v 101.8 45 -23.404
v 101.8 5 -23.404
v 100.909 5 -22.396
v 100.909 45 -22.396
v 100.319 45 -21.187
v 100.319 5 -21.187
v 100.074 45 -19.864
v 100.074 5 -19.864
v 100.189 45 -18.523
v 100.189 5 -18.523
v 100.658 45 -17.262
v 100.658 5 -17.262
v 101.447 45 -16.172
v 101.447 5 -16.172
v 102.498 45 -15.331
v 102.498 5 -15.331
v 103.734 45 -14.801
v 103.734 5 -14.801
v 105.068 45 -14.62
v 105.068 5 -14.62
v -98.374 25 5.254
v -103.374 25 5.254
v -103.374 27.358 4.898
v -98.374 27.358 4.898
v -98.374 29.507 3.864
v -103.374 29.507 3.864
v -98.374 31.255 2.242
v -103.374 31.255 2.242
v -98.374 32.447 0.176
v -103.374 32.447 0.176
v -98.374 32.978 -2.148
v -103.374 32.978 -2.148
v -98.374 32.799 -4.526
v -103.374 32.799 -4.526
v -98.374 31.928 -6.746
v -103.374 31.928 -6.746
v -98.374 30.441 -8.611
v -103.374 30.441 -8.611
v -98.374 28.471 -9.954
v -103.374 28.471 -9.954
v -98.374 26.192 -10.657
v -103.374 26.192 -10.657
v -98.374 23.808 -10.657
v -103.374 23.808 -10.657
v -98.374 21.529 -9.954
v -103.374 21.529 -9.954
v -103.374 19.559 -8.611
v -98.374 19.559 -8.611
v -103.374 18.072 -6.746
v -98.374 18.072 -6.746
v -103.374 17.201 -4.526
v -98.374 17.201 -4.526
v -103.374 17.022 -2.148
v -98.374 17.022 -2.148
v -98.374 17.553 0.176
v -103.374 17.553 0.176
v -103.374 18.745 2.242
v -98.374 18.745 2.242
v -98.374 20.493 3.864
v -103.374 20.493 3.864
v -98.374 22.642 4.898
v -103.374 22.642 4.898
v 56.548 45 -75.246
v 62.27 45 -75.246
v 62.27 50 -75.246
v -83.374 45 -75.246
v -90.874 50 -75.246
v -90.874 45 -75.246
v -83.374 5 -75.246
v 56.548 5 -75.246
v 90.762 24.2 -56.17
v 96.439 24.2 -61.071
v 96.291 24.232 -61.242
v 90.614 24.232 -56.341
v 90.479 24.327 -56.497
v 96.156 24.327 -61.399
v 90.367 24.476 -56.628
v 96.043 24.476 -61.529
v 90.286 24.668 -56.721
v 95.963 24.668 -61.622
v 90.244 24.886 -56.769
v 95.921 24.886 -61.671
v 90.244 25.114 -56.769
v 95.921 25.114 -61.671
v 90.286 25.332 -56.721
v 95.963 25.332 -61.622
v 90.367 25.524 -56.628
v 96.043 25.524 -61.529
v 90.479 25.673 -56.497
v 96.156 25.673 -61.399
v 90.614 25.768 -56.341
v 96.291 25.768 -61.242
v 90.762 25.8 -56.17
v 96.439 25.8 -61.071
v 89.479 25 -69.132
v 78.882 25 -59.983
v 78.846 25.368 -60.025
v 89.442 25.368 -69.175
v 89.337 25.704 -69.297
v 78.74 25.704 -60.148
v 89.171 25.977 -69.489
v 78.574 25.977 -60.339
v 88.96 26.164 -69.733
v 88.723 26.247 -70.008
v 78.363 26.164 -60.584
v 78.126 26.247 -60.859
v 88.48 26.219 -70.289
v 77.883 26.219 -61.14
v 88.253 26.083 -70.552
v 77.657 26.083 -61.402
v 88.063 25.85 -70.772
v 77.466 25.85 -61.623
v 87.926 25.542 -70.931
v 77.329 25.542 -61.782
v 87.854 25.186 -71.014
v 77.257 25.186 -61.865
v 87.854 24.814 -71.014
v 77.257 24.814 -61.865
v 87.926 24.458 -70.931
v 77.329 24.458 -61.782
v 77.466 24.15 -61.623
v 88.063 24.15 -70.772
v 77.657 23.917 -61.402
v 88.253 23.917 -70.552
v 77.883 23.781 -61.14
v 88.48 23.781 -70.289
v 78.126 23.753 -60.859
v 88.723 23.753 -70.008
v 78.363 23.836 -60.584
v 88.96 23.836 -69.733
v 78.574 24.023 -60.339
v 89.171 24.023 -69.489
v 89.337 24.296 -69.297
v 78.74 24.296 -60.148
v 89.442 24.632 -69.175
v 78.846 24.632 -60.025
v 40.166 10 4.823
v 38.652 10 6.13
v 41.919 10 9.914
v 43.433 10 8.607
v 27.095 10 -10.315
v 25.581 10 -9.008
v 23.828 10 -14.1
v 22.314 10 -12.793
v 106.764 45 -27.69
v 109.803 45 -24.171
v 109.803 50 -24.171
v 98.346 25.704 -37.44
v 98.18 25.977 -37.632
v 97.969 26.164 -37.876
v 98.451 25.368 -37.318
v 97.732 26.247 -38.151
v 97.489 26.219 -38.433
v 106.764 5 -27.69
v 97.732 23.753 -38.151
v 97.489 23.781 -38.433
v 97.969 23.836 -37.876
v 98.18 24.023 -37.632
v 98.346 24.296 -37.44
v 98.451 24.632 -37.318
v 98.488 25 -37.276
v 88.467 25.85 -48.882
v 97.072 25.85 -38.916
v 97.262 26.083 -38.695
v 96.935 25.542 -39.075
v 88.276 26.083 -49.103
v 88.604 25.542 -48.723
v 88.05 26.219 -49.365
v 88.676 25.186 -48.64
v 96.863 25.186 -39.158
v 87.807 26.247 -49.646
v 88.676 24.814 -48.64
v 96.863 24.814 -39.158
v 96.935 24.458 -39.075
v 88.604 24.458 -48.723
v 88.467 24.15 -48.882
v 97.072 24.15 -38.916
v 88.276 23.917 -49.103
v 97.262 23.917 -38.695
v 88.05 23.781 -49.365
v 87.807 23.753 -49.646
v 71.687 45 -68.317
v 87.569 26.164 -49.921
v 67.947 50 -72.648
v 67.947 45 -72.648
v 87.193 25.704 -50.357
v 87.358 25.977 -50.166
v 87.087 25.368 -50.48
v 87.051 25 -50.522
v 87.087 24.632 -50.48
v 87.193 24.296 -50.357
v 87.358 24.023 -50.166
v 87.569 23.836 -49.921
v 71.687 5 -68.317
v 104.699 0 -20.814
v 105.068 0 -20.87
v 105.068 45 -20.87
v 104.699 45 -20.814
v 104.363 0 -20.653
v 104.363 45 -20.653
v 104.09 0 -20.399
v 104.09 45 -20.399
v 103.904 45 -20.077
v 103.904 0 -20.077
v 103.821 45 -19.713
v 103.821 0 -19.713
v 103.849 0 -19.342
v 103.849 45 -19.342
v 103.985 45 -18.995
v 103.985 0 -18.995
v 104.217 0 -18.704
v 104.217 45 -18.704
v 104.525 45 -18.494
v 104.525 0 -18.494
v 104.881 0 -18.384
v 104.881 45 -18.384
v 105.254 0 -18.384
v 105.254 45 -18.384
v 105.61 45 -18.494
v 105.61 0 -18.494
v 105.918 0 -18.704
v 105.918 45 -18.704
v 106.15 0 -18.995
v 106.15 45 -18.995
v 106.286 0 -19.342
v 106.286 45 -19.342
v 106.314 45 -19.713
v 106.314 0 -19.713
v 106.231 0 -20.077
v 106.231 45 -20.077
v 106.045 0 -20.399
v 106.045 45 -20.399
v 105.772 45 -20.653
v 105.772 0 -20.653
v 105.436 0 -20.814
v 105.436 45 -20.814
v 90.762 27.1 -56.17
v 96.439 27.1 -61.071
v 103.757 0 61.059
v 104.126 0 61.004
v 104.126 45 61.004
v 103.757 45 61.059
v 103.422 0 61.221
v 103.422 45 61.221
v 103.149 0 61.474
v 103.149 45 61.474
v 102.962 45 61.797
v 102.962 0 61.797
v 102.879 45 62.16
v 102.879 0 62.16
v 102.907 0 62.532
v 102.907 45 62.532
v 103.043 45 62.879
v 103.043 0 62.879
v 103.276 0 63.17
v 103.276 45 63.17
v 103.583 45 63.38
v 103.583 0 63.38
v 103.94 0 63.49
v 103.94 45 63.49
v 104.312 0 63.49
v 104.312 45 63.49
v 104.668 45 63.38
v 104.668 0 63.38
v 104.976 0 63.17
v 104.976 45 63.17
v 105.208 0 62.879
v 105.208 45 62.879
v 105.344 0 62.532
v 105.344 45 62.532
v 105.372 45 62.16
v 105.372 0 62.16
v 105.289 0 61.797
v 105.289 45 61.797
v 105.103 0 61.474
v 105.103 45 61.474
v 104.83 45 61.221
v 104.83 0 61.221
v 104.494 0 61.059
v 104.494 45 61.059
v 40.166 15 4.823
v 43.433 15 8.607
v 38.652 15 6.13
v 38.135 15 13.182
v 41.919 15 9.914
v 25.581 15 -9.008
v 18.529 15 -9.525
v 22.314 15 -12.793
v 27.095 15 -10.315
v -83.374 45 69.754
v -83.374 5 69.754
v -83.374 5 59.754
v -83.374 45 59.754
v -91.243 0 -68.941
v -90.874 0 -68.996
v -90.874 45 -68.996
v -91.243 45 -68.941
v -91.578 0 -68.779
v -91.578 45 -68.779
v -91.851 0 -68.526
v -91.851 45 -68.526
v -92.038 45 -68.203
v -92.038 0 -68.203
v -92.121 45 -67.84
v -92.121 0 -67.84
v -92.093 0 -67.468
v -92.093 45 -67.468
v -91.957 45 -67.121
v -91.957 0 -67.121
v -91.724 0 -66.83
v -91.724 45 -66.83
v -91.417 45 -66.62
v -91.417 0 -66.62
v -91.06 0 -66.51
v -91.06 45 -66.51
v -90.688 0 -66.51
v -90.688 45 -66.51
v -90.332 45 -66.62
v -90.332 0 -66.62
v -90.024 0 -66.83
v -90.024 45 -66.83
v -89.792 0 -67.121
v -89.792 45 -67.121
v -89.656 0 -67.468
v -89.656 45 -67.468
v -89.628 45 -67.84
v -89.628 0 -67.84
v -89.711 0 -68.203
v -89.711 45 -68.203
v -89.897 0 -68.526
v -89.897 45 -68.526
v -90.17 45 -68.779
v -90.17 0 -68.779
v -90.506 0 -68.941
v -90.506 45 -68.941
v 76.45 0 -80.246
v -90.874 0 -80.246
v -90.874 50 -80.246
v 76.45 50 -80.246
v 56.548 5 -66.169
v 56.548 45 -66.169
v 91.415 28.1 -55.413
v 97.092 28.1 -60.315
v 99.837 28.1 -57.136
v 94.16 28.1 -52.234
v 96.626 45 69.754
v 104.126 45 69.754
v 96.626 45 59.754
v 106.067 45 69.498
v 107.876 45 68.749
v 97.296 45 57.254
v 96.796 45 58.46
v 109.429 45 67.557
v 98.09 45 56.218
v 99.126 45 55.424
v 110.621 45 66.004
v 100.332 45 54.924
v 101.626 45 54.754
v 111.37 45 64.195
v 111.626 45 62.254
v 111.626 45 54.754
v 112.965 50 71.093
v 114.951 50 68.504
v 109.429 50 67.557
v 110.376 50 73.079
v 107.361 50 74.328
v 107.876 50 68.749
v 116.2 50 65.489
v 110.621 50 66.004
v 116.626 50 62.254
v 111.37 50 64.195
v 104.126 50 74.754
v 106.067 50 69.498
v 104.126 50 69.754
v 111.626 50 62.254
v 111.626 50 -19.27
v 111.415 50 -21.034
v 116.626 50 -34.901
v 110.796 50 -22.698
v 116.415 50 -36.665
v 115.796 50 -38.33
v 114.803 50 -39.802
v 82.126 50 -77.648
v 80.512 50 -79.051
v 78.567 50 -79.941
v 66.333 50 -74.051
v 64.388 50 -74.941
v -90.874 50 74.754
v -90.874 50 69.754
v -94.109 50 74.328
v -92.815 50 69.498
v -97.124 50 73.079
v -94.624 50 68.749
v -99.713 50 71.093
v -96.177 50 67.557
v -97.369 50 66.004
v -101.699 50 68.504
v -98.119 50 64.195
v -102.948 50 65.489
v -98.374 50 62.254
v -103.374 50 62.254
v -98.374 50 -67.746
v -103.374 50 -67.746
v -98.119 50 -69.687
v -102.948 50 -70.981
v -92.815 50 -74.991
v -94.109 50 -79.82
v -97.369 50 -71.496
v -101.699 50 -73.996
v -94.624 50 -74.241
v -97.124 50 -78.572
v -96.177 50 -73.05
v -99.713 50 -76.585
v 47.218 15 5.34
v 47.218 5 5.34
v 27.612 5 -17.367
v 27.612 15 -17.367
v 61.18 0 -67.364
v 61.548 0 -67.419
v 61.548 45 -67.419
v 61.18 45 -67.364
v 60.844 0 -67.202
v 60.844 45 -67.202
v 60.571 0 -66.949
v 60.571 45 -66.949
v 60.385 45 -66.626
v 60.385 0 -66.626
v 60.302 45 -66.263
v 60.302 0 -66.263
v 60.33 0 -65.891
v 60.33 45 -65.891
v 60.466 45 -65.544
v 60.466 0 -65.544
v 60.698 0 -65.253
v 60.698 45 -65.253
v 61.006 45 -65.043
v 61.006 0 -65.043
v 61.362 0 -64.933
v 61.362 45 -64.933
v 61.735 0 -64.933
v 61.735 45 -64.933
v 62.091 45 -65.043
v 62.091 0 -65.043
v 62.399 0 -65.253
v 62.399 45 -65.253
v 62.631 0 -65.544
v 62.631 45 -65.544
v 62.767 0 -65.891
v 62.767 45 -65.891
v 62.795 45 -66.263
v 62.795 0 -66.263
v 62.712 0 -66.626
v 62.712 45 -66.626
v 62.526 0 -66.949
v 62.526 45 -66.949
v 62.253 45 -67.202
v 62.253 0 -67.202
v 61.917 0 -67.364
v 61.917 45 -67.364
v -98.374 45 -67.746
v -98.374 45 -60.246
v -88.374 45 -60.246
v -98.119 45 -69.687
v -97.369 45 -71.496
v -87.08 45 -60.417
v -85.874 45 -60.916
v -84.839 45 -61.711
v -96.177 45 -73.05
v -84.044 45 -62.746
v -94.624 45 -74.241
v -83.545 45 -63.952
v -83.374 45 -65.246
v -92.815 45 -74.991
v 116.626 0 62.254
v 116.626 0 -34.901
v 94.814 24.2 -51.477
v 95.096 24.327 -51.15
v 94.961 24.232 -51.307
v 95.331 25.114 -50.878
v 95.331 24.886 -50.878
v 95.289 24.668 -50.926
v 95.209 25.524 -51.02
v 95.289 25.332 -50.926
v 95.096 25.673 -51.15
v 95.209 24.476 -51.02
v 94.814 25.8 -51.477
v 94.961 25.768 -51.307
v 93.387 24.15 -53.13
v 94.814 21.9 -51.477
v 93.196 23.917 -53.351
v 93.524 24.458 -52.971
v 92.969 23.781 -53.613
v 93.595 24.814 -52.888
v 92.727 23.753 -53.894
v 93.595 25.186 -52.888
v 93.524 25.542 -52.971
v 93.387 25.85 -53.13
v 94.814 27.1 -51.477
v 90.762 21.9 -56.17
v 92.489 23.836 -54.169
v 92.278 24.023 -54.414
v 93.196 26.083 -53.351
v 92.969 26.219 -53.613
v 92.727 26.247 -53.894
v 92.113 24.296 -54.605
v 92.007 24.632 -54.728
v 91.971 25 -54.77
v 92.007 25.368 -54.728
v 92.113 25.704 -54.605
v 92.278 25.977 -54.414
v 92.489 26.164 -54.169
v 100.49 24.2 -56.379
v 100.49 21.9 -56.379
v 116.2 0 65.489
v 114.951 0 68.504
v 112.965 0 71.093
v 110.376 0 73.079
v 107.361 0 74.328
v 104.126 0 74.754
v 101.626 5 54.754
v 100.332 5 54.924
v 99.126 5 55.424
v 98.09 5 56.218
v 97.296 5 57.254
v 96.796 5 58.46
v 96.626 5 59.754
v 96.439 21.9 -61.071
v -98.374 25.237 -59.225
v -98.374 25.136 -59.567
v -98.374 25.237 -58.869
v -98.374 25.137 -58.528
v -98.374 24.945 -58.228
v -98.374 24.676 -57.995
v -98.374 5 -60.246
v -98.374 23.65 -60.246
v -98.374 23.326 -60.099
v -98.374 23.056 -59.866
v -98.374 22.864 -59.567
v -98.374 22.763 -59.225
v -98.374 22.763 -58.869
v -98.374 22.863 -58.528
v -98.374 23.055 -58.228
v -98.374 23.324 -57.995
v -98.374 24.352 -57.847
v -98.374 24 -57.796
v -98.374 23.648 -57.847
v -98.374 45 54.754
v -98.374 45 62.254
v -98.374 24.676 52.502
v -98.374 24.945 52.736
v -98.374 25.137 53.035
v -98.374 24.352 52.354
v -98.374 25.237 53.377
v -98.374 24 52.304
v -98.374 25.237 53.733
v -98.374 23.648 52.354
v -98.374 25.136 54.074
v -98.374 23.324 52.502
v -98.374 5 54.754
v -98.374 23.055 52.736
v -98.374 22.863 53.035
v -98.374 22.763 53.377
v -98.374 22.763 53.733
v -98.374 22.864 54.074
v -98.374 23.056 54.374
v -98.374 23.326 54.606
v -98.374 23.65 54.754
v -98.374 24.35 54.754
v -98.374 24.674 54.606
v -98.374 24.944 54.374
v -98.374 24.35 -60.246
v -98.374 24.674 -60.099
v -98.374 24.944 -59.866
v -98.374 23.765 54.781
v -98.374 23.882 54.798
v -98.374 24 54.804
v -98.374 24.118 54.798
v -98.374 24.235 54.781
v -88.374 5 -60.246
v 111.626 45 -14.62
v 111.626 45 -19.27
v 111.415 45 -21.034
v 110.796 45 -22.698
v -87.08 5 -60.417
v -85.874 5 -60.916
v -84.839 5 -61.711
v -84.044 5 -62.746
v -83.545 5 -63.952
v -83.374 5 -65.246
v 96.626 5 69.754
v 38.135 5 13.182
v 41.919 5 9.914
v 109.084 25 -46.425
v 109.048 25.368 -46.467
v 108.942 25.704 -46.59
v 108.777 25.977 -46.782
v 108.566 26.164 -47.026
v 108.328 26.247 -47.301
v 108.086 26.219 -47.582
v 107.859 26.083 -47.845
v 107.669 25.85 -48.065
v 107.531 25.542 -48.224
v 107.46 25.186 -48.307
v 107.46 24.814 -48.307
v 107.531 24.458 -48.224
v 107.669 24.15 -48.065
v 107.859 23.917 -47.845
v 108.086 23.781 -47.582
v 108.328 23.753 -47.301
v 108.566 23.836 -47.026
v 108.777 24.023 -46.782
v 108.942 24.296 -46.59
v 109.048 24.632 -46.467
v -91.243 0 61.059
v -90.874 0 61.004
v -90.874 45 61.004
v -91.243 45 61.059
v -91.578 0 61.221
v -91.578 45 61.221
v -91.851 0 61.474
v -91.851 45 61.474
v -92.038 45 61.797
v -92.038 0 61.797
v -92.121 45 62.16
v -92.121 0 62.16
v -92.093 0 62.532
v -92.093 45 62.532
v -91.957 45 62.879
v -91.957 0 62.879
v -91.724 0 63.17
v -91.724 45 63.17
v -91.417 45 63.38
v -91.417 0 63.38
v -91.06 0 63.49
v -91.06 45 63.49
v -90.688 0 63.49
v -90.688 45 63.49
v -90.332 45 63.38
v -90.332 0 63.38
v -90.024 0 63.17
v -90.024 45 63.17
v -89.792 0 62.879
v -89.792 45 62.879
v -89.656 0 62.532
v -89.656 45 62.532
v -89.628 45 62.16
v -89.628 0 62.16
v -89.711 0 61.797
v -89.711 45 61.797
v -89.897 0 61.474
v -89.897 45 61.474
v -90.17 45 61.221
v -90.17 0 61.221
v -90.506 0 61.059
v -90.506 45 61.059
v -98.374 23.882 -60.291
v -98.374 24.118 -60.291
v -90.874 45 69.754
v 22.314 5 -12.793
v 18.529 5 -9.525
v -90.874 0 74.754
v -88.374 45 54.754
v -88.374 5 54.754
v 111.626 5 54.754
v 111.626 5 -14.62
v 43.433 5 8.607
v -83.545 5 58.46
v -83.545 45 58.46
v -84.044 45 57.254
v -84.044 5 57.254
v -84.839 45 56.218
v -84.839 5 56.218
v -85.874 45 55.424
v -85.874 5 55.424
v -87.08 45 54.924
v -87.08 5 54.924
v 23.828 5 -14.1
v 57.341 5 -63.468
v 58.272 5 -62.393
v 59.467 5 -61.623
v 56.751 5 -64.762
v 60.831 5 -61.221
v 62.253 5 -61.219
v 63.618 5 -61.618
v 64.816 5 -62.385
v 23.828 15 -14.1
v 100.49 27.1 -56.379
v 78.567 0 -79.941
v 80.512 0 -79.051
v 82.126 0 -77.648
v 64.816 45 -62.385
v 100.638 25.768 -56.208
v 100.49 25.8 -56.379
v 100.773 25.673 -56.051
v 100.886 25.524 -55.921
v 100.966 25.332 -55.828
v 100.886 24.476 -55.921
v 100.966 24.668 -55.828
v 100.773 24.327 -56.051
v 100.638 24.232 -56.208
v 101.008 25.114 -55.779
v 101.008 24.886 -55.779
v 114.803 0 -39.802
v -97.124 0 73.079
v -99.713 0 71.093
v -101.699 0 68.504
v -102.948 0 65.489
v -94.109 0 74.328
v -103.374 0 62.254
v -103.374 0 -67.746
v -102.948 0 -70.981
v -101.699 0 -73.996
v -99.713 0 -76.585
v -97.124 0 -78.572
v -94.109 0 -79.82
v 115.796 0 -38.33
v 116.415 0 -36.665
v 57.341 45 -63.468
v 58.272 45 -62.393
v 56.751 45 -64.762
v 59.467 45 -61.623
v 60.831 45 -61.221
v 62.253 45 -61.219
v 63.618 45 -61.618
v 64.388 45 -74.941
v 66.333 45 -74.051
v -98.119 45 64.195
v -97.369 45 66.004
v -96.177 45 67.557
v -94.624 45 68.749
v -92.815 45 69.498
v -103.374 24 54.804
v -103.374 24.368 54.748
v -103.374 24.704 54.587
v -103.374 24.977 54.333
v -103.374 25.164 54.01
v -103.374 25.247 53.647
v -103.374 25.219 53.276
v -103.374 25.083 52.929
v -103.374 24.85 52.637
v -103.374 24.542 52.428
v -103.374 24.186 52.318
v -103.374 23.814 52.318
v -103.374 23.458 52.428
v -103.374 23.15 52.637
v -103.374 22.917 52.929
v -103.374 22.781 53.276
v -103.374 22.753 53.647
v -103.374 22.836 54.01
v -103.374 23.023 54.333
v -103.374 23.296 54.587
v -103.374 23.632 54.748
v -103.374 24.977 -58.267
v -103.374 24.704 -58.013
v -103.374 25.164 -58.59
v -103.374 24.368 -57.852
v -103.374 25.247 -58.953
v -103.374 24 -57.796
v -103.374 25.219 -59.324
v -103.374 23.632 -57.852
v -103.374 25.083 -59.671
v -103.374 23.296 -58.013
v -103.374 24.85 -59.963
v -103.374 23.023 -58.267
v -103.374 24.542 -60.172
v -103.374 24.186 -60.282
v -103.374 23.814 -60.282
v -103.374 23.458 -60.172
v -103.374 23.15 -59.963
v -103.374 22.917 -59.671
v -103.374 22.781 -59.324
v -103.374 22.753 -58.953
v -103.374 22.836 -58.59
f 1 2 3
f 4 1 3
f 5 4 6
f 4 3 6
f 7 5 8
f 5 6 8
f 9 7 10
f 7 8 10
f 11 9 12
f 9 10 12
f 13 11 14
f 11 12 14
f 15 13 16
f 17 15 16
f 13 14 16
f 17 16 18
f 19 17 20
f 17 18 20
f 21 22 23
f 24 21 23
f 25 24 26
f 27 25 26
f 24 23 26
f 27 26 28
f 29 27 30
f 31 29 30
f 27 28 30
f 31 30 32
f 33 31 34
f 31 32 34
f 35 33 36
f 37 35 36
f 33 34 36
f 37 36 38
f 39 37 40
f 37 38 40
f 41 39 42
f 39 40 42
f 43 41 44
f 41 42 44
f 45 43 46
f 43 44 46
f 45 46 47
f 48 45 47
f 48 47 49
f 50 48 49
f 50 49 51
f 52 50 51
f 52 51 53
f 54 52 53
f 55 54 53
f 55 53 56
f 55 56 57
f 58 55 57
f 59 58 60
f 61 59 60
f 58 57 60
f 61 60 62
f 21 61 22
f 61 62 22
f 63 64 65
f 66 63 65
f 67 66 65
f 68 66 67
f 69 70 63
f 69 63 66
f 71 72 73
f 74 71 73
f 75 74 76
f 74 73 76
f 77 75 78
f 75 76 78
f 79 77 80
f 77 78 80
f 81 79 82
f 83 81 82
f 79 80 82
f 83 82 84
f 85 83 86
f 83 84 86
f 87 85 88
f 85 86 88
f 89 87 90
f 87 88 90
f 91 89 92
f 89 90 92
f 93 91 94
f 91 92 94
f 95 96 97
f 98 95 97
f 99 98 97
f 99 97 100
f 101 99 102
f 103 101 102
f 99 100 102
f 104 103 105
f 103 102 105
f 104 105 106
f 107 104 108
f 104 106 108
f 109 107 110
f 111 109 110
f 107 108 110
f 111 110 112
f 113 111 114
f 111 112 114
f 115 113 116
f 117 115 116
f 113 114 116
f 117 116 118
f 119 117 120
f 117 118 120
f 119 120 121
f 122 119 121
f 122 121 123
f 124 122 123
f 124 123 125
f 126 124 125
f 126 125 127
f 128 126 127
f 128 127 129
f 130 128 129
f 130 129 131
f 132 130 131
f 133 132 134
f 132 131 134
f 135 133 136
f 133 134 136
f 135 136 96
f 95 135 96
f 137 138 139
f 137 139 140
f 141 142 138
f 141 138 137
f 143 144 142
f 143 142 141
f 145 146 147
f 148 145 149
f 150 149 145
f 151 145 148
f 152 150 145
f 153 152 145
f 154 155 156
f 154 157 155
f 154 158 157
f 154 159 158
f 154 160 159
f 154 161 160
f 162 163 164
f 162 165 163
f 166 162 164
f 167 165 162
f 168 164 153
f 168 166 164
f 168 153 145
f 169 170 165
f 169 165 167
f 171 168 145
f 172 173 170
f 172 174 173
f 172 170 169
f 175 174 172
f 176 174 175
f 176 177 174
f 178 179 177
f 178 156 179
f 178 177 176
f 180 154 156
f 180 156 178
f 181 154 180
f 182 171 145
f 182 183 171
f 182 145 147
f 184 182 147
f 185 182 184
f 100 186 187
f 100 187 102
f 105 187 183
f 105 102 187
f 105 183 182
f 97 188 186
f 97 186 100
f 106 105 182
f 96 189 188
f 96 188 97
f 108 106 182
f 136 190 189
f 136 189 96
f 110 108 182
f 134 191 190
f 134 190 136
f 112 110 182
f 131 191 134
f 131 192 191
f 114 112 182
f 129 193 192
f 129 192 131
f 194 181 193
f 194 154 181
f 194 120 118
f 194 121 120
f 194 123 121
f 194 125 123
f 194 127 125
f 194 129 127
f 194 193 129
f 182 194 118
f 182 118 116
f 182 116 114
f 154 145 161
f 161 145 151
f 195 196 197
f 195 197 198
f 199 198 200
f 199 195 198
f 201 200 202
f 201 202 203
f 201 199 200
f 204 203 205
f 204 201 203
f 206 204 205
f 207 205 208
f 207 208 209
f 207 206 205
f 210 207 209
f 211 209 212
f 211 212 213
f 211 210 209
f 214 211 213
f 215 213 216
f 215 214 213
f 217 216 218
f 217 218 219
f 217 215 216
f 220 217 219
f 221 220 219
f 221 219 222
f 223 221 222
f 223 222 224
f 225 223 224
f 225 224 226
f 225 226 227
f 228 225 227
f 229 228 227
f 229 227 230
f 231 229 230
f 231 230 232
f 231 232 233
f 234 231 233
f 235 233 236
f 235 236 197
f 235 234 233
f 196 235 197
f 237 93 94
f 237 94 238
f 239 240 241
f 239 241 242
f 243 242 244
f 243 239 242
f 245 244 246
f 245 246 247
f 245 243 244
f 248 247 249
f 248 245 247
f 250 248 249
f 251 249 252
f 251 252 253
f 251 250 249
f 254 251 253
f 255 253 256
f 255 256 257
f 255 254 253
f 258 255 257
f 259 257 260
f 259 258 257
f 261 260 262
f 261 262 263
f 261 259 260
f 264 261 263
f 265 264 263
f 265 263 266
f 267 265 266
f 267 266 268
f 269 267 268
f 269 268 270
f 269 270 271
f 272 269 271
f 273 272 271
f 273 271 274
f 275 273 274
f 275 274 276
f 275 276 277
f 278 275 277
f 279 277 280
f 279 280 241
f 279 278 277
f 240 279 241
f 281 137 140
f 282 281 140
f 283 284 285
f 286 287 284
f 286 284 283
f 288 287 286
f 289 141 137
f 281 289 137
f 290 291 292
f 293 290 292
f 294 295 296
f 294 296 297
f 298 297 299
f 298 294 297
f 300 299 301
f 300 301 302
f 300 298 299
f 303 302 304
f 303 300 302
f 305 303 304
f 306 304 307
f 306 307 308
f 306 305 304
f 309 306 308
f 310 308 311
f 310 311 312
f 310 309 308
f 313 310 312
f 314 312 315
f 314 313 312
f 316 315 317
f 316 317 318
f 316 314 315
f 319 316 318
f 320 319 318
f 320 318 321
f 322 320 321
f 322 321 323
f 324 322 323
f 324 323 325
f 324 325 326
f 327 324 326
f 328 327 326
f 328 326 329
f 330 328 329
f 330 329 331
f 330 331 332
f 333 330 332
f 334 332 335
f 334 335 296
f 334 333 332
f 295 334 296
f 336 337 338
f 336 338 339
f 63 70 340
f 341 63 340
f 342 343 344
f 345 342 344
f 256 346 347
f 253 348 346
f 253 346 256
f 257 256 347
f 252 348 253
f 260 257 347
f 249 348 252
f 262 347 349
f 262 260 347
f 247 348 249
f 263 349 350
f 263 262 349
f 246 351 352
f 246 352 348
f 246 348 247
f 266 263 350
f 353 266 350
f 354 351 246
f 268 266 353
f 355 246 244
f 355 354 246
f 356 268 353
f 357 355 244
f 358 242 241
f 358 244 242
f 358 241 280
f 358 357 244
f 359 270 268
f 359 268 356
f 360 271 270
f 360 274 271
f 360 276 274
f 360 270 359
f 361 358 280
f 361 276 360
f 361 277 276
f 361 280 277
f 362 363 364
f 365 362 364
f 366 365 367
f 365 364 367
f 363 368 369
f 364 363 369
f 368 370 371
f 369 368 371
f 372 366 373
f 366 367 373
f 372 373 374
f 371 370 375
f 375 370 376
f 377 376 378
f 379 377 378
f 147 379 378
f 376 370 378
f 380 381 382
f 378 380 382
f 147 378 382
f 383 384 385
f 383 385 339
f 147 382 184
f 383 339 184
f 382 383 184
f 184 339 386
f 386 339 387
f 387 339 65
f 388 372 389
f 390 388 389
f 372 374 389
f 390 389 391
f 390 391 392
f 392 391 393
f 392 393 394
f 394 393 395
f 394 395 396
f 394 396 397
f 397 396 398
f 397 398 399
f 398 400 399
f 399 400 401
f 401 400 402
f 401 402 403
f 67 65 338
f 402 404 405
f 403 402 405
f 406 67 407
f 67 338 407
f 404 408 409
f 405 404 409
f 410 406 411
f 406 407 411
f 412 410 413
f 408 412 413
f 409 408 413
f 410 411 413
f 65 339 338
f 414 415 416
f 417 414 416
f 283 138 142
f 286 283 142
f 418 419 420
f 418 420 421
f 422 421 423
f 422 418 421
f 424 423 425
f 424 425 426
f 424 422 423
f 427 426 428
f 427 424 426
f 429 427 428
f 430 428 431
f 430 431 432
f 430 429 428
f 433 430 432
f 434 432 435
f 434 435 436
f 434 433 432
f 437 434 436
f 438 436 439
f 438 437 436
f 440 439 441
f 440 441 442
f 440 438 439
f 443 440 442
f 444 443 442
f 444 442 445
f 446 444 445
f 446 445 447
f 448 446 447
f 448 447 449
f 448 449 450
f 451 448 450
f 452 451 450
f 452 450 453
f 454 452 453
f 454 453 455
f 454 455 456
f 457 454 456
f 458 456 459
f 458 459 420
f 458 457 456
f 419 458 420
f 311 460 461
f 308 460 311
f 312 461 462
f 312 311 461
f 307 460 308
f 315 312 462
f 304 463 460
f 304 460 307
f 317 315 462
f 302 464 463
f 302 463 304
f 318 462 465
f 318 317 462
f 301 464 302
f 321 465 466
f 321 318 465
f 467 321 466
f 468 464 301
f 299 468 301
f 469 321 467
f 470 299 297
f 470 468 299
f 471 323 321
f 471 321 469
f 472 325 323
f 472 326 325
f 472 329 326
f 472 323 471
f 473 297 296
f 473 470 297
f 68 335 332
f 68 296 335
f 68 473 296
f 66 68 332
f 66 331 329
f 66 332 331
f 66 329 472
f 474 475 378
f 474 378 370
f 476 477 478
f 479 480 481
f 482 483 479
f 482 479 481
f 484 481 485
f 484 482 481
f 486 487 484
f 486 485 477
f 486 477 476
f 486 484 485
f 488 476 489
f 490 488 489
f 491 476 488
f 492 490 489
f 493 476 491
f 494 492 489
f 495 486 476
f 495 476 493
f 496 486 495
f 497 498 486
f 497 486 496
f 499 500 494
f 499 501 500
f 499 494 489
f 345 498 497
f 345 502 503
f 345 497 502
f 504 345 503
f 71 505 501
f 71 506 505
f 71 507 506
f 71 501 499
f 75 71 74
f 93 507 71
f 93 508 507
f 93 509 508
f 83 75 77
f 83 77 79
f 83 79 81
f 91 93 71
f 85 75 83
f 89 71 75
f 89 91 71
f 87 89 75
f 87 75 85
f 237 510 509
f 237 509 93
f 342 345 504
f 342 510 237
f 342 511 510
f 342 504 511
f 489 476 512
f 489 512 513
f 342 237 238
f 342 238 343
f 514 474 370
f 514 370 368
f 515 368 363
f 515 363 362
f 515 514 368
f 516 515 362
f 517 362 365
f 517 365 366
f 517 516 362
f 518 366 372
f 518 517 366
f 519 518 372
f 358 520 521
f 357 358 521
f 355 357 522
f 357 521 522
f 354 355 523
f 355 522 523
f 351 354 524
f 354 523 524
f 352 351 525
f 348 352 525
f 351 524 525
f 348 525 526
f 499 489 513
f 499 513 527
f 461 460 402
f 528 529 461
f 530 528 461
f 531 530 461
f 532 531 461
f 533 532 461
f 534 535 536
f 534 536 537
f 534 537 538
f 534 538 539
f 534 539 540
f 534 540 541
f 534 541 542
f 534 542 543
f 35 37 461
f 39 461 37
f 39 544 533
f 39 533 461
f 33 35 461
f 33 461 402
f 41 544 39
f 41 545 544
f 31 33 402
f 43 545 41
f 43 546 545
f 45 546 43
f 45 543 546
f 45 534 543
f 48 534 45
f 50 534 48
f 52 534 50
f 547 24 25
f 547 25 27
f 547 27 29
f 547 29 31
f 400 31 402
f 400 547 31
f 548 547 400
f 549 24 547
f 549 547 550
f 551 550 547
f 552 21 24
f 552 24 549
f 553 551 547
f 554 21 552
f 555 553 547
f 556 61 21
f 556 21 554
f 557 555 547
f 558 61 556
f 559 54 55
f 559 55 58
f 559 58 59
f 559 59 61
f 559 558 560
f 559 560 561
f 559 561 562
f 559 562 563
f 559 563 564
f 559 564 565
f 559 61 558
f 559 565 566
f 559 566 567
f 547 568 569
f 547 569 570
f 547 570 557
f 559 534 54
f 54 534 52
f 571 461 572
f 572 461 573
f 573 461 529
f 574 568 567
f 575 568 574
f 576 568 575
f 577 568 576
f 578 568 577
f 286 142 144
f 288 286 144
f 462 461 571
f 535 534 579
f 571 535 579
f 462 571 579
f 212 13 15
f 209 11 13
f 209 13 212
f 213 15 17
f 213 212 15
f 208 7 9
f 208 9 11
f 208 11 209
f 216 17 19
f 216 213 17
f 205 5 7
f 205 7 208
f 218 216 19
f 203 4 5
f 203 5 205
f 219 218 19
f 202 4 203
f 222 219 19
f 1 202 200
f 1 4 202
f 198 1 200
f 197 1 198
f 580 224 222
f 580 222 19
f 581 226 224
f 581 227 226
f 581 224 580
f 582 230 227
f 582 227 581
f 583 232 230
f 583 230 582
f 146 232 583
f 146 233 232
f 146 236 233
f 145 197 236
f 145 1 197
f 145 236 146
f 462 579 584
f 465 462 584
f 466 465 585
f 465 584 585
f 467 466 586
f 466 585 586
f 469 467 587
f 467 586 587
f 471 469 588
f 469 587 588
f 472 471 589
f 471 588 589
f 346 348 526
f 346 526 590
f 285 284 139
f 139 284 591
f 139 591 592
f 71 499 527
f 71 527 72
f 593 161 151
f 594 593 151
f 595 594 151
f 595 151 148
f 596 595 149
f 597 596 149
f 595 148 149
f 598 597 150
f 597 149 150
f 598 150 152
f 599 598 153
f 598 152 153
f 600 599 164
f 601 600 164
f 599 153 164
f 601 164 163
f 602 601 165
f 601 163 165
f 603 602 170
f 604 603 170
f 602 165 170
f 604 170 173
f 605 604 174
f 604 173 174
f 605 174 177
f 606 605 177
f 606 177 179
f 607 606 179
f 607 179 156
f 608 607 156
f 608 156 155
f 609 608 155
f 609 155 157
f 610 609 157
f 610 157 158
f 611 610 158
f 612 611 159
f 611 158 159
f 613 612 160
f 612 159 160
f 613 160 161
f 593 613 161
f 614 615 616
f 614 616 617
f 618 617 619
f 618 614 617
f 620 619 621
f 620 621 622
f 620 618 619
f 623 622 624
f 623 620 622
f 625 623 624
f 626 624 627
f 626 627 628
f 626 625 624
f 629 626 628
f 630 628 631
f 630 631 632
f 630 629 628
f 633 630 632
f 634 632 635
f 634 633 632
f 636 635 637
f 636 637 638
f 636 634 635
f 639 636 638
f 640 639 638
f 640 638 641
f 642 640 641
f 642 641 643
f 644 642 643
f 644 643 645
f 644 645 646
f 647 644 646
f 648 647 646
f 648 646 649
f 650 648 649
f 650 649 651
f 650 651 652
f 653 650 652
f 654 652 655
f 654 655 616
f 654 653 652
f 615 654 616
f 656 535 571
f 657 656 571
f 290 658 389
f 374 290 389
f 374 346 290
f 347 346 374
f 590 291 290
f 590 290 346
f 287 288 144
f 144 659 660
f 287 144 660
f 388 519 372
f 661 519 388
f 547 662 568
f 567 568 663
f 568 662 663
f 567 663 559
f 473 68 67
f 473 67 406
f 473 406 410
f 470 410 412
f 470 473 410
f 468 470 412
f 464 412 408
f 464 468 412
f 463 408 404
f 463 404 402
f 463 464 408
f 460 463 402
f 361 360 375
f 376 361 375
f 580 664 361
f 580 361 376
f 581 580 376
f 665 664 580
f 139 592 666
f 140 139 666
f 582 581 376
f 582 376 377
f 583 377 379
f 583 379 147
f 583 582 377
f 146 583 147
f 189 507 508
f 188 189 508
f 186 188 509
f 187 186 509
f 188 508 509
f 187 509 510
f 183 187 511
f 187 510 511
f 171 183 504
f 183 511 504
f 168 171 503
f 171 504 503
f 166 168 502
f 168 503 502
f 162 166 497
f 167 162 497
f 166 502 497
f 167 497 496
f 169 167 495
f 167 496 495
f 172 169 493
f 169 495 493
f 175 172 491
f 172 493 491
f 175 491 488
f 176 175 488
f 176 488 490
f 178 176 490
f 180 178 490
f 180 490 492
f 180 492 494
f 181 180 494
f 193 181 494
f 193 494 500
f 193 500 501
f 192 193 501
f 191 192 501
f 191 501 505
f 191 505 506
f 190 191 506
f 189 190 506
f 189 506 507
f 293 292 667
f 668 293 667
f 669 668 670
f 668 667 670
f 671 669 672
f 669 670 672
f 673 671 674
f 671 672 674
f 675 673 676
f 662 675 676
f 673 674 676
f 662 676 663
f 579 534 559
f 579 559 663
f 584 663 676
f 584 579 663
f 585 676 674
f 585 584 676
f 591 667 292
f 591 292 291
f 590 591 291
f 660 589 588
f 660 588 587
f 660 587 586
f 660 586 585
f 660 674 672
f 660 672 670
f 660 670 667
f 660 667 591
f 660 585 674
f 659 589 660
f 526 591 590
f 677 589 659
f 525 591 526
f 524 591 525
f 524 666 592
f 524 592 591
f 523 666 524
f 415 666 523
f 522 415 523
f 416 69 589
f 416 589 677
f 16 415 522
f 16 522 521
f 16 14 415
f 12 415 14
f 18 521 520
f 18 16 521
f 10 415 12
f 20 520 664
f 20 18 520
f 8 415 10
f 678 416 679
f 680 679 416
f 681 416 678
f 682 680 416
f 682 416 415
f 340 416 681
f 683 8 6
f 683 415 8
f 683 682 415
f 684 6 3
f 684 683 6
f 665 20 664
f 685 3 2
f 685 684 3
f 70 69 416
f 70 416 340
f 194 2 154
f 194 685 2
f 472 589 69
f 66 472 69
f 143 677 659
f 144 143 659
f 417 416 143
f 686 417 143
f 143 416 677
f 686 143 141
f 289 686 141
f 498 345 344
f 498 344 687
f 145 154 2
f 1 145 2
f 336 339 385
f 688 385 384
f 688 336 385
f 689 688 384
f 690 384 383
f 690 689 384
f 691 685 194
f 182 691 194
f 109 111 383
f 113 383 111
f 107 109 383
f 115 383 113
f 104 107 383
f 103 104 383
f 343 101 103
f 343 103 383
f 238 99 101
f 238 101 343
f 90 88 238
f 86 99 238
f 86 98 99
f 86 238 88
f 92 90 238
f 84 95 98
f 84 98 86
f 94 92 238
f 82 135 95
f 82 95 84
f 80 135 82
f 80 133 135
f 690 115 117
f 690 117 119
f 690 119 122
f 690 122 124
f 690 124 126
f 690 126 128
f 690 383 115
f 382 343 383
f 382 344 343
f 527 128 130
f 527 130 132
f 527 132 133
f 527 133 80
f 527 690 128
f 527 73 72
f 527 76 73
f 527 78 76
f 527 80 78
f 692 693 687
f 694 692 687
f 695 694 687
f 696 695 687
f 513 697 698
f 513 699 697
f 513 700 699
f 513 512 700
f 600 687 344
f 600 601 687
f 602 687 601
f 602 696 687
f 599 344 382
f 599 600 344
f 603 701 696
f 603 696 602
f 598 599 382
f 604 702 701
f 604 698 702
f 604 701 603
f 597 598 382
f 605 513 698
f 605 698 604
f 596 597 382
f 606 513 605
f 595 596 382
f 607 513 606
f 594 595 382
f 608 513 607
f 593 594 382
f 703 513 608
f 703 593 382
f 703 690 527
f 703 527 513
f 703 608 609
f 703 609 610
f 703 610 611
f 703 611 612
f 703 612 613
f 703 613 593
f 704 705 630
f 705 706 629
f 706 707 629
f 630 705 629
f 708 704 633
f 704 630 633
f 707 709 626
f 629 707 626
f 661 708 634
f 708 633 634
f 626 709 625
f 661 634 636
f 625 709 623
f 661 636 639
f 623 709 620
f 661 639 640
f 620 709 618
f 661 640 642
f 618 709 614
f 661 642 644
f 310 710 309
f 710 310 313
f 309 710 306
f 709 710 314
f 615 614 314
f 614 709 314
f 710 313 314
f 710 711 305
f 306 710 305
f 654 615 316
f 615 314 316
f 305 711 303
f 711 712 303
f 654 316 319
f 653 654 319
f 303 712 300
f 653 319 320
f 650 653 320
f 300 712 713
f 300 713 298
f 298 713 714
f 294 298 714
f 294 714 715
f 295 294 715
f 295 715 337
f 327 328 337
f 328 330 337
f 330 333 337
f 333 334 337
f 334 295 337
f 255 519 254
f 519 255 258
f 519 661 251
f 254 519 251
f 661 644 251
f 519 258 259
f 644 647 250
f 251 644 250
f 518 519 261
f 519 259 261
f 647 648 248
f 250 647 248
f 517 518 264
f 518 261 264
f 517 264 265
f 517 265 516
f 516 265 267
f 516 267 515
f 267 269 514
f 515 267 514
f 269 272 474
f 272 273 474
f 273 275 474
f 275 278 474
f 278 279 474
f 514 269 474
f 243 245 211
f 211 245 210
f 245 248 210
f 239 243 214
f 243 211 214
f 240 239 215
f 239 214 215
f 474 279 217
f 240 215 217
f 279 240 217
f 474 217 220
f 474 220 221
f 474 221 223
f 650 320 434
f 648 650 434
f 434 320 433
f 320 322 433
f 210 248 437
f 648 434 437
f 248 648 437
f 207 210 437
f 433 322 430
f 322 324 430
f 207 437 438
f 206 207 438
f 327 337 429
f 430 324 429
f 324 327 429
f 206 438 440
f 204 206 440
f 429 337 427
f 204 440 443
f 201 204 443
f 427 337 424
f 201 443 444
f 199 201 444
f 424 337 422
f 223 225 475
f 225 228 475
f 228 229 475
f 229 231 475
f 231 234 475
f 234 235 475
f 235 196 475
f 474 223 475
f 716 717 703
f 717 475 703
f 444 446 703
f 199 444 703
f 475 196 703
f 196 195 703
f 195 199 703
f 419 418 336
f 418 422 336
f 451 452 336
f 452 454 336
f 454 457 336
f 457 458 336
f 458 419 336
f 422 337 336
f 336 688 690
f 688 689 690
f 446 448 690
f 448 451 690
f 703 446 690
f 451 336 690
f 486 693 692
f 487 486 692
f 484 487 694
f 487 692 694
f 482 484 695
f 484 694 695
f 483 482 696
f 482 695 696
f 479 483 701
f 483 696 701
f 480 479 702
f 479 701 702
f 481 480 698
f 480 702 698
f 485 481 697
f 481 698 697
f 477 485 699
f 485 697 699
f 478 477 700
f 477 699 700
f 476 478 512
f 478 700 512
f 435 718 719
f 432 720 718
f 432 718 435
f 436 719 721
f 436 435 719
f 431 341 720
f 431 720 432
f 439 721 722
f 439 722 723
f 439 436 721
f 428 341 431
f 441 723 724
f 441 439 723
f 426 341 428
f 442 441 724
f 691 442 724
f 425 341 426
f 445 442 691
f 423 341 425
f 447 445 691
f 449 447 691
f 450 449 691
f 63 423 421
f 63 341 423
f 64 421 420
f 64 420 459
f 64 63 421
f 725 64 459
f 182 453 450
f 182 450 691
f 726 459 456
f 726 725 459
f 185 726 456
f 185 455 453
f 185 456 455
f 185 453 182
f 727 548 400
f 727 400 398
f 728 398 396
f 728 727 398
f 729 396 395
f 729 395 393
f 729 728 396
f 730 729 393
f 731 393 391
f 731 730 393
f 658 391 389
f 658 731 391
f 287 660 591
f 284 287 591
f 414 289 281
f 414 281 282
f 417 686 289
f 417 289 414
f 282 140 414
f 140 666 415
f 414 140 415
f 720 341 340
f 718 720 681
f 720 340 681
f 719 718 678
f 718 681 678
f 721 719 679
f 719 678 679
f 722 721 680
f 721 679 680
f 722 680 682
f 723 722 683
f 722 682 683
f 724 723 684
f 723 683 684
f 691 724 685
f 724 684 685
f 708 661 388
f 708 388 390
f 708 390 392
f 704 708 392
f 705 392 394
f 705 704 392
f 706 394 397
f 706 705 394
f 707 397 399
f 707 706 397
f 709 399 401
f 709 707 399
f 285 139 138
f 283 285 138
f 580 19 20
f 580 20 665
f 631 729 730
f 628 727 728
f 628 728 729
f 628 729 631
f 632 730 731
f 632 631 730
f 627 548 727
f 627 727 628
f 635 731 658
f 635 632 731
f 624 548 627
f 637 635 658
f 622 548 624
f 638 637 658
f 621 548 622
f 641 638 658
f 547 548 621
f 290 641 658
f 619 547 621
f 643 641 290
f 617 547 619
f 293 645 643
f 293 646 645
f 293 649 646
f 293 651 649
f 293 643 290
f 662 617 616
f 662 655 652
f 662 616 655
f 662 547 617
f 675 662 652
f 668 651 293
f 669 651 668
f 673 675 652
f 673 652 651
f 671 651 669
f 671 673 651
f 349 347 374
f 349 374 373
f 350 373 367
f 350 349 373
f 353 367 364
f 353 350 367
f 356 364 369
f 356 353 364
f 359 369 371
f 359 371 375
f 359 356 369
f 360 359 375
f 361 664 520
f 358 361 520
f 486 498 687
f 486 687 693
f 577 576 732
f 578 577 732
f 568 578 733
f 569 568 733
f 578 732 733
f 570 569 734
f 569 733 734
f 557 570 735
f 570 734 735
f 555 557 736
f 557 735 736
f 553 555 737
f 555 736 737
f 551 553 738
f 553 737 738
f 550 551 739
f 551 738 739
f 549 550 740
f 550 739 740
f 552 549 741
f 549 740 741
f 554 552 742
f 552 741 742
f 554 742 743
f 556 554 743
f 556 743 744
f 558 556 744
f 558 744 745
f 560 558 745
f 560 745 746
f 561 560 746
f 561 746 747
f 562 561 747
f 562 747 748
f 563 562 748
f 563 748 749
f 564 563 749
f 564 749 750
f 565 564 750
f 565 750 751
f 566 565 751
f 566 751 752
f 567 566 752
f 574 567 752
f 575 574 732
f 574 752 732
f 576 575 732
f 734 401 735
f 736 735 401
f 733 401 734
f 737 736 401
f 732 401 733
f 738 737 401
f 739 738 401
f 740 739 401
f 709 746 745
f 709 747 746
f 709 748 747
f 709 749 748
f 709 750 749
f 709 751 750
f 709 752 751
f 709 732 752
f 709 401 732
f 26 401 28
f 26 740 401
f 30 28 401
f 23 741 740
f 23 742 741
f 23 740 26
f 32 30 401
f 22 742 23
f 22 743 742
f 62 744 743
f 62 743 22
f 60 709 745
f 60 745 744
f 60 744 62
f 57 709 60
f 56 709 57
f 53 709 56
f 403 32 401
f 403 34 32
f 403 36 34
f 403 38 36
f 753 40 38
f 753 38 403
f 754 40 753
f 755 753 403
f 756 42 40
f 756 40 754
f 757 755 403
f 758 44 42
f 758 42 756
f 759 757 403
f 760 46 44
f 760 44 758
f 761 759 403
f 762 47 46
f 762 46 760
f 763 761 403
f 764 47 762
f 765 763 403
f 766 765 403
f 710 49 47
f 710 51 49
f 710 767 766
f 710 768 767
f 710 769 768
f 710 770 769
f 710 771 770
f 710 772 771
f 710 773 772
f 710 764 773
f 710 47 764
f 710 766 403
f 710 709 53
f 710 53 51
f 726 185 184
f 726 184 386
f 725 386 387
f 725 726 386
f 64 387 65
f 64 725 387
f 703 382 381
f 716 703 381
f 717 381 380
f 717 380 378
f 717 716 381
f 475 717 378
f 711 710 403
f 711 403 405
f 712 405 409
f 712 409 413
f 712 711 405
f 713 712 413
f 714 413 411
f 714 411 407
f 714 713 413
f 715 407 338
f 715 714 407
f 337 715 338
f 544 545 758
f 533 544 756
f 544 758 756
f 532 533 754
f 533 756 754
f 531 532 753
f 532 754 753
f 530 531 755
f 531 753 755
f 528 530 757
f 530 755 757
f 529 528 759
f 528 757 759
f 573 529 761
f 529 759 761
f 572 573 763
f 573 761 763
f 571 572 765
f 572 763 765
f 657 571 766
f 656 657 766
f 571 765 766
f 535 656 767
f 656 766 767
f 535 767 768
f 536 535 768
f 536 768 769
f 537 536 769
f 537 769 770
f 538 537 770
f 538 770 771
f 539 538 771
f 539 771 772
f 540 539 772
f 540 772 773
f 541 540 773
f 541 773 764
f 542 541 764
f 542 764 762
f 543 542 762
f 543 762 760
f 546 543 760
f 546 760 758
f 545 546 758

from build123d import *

# Parameters (mm, degrees)
EXTRUDE_2_DEPTH     = 5
EXTRUDE_2_2_DEPTH   = 5
EXTRUDE_3_DEPTH     = 50
EXTRUDE_4_DEPTH     = 10
CUT_EXTRUDE_1_DEPTH = 7.5
SKETCH_9_R          = 1.25
CUT_EXTRUDE_3_DEPTH = 20
SKETCH_10_R         = 8
SKETCH_10_R_2       = 1.25
CUT_EXTRUDE_7_DEPTH = 5
SKETCH_1_9_R        = 1.25
EXTRUDE_5_DEPTH     = 45
SKETCH_14_R         = 1.25
CUT_EXTRUDE_8_DEPTH = 14
EXTRUDE_6_DEPTH     = 15


# Read off the part's stored shape, not the designer's step: 凸台-拉伸4
with BuildPart() as part:
    # 草图1 → 凸台-拉伸2 (new body)
    with BuildSketch(Plane(origin=(0, 0, 0), x_dir=(1, 0, 0), z_dir=(0, 1, 0))):
        with BuildLine():
            Line((56.548408352, 75.246242124), (-83.374180902, 75.246242124))
            Line((-83.374180902, 75.246242124), (-83.374180902, 65.246242124))
            ThreePointArc((-83.374180902, 65.246242124), (-84.838646996, 61.710708218), (-88.374180902, 60.246242124))
            Line((-88.374180902, 60.246242124), (-98.374180902, 60.246242124))
            Line((-98.374180902, 60.246242124), (-98.374180902, -54.753757876))
            Line((-98.374180902, -54.753757876), (-88.374180902, -54.753757876))
            ThreePointArc((-88.374180902, -54.753757876), (-84.838646996, -56.21822397), (-83.374180902, -59.753757876))
            Line((-83.374180902, -59.753757876), (-83.374180902, -69.753757876))
            Line((-83.374180902, -69.753757876), (96.625819098, -69.753757876))
            Line((96.625819098, -69.753757876), (96.625819098, -59.753757876))
            ThreePointArc((96.625819098, -59.753757876), (98.090285193, -56.21822397), (101.625819098, -54.753757876))
            Line((101.625819098, -54.753757876), (111.625819098, -54.753757876))
            Line((111.625819098, -54.753757876), (111.625819098, 14.619924984))
            Line((111.625819098, 14.619924984), (105.067595409, 14.619924984))
            ThreePointArc((105.067595409, 14.619924984), (100.381304866, 17.876743713), (101.799973847, 23.404452606))
            Line((101.799973847, 23.404452606), (106.763929588, 27.690411234))
            Line((106.763929588, 27.690411234), (71.686518841, 68.316728374))
            Line((71.686518841, 68.316728374), (64.816029914, 62.384638559))
            ThreePointArc((64.816029914, 62.384638559), (59.467315828, 61.622843062), (56.548408352, 66.169166182))
            Line((56.548408352, 66.169166182), (56.548408352, 75.246242124))
        make_face()
        Polygon((18.529202454, 9.525154804), (27.612068748, 17.367446554), (47.217798123, -5.33971918), (38.134931829, -13.18201093), align=None, mode=Mode.SUBTRACT)
    extrude(amount=EXTRUDE_2_DEPTH)

    # 草图1<6> → 凸台-拉伸3 (add)
    with BuildSketch(Plane(origin=(0, 0, 0), x_dir=(1, 0, 0), z_dir=(0, 1, 0))):
        with BuildLine():
            Line((116.625819098, 34.900965901), (116.625819098, -62.253757876))
            ThreePointArc((116.625819098, -62.253757876), (112.964653863, -71.092592641), (104.125819098, -74.753757876))
            Line((104.125819098, -74.753757876), (-90.874180902, -74.753757876))
            ThreePointArc((-90.874180902, -74.753757876), (-99.713015666, -71.092592641), (-103.374180902, -62.253757876))
            Line((-103.374180902, -62.253757876), (-103.374180902, 67.746242124))
            ThreePointArc((-103.374180902, 67.746242124), (-99.713015666, 76.585076889), (-90.874180902, 80.246242124))
            Line((-90.874180902, 80.246242124), (76.449603474, 80.246242124))
            ThreePointArc((76.449603474, 80.246242124), (79.57124226, 79.565726803), (82.126394907, 77.647674468))
            Line((82.126394907, 77.647674468), (114.802610532, 39.802398244))
            ThreePointArc((114.802610532, 39.802398244), (116.155254913, 37.515737807), (116.625819098, 34.900965901))
        make_face()
        with BuildLine():
            ThreePointArc((111.625819098, 19.269608073), (111.155254913, 21.88437998), (109.802610532, 24.171040417))
            Line((109.802610532, 24.171040417), (67.947110848, 72.647674468))
            ThreePointArc((67.947110848, 72.647674468), (65.3919582, 74.565726803), (62.270319414, 75.246242124))
            Line((62.270319414, 75.246242124), (-90.874180902, 75.246242124))
            ThreePointArc((-90.874180902, 75.246242124), (-96.17748176, 73.049542983), (-98.374180902, 67.746242124))
            Line((-98.374180902, 67.746242124), (-98.374180902, -62.253757876))
            ThreePointArc((-98.374180902, -62.253757876), (-96.17748176, -67.557058735), (-90.874180902, -69.753757876))
            Line((-90.874180902, -69.753757876), (104.125819098, -69.753757876))
            ThreePointArc((104.125819098, -69.753757876), (109.429119957, -67.557058735), (111.625819098, -62.253757876))
            Line((111.625819098, -62.253757876), (111.625819098, 19.269608073))
        make_face(mode=Mode.SUBTRACT)
    extrude(amount=EXTRUDE_3_DEPTH)

    # 凸台-拉伸4 outline → 凸台-拉伸4 (add)
    with BuildSketch(Plane(origin=(0, 0, 0), x_dir=(1, 0, 0), z_dir=(0, 1, 0))):
        Polygon((43.4332705, -8.607340743), (23.827541125, 14.099824991), (22.313730076, 12.792776366), (41.919459451, -9.914389368), align=None)
    extrude(amount=EXTRUDE_4_DEPTH)

    # 草图6 → 切除-拉伸1 (cut)
    with BuildSketch(Plane(origin=(85.459602861, 0, -73.787185323), x_dir=(-0.6535243124977221, 0, -0.7569055244707755), z_dir=(0.7569055244707754, 0, -0.653524312497722))):
        with BuildLine():
            Line((-22.999642003, 24.2), (-22.999642003, 21.9))
            Line((-22.999642003, 21.9), (-16.799642003, 21.9))
            Line((-16.799642003, 21.9), (-16.799642003, 24.2))
            ThreePointArc((-16.799642003, 24.2), (-15.999642003, 25), (-16.799642003, 25.8))
            Line((-16.799642003, 25.8), (-16.799642003, 27.1))
            Line((-16.799642003, 27.1), (-17.799642003, 28.1))
            Line((-17.799642003, 28.1), (-21.999642003, 28.1))
            Line((-21.999642003, 28.1), (-22.999642003, 27.1))
            Line((-22.999642003, 27.1), (-22.999642003, 25.8))
            ThreePointArc((-22.999642003, 25.8), (-23.799642003, 25), (-22.999642003, 24.2))
        make_face()
    extrude(amount=-CUT_EXTRUDE_1_DEPTH, mode=Mode.SUBTRACT)

    # 草图9 → 切除-拉伸3 (cut)
    with BuildSketch(Plane(origin=(79.782811427, 0, -68.885752979), x_dir=(-0.6535243124977224, 0, -0.7569055244707754), z_dir=(0.7569055244707754, 0, -0.6535243124977224))):
        with Locations((-19.899642003, 25)):
            Circle(SKETCH_9_R)
    extrude(amount=-CUT_EXTRUDE_3_DEPTH, mode=Mode.SUBTRACT)

    # 草图10 → 切除-拉伸7 (cut)
    with BuildSketch(Plane.ZY.offset(103.374180902)):
        with Locations((-2.746242124, 25)):
            Circle(SKETCH_10_R)
        with Locations((-59.046242124, 24)):
            Circle(SKETCH_10_R_2)
        with Locations((53.553757876, 24)):
            Circle(SKETCH_10_R_2)
    extrude(amount=-CUT_EXTRUDE_7_DEPTH, mode=Mode.SUBTRACT)

    # 草图1<9> → 凸台-拉伸5 (add)
    # profile 1 of 5: a face of its own
    with BuildSketch(Plane(origin=(0, 0, 0), x_dir=(1, 0, 0), z_dir=(0, 1, 0))):
        with BuildLine():
            Line((-83.374180902, 75.246242124), (-90.874180902, 75.246242124))
            ThreePointArc((-90.874180902, 75.246242124), (-96.17748176, 73.049542983), (-98.374180902, 67.746242124))
            Line((-98.374180902, 67.746242124), (-98.374180902, 60.246242124))
            Line((-98.374180902, 60.246242124), (-88.374180902, 60.246242124))
            ThreePointArc((-88.374180902, 60.246242124), (-84.838646996, 61.710708218), (-83.374180902, 65.246242124))
            Line((-83.374180902, 65.246242124), (-83.374180902, 75.246242124))
        make_face()
        with Locations(Location((-90.874180902, 67.746242124, 0), (0, 0, 90))):
            Circle(SKETCH_1_9_R, mode=Mode.SUBTRACT)
    # profile 2 of 5: a face of its own
    with BuildSketch(Plane(origin=(0, 0, 0), x_dir=(1, 0, 0), z_dir=(0, 1, 0))):
        with BuildLine():
            Line((-88.374180902, -54.753757876), (-98.374180902, -54.753757876))
            Line((-98.374180902, -54.753757876), (-98.374180902, -62.253757876))
            ThreePointArc((-98.374180902, -62.253757876), (-96.17748176, -67.557058735), (-90.874180902, -69.753757876))
            Line((-90.874180902, -69.753757876), (-83.374180902, -69.753757876))
            Line((-83.374180902, -69.753757876), (-83.374180902, -59.753757876))
            ThreePointArc((-83.374180902, -59.753757876), (-84.838646996, -56.21822397), (-88.374180902, -54.753757876))
        make_face()
        with Locations(Location((-90.874180902, -62.253757876, 0), (0, 0, 90))):
            Circle(SKETCH_1_9_R, mode=Mode.SUBTRACT)
    # profile 3 of 5: a face of its own
    with BuildSketch(Plane(origin=(0, 0, 0), x_dir=(1, 0, 0), z_dir=(0, 1, 0))):
        with BuildLine():
            Line((96.625819098, -59.753757876), (96.625819098, -69.753757876))
            Line((96.625819098, -69.753757876), (104.125819098, -69.753757876))
            ThreePointArc((104.125819098, -69.753757876), (109.429119957, -67.557058735), (111.625819098, -62.253757876))
            Line((111.625819098, -62.253757876), (111.625819098, -54.753757876))
            Line((111.625819098, -54.753757876), (101.625819098, -54.753757876))
            ThreePointArc((101.625819098, -54.753757876), (98.090285193, -56.21822397), (96.625819098, -59.753757876))
        make_face()
        with Locations(Location((104.125819098, -62.253757876, 0), (0, 0, 90))):
            Circle(SKETCH_1_9_R, mode=Mode.SUBTRACT)
    # profile 4 of 5: a face of its own
    with BuildSketch(Plane(origin=(0, 0, 0), x_dir=(1, 0, 0), z_dir=(0, 1, 0))):
        with BuildLine():
            Line((109.802610532, 24.171040417), (106.763929588, 27.690411234))
            Line((106.763929588, 27.690411234), (101.799973847, 23.404452606))
            ThreePointArc((101.799973847, 23.404452606), (100.381304866, 17.876743713), (105.067595409, 14.619924984))
            Line((105.067595409, 14.619924984), (111.625819098, 14.619924984))
            Line((111.625819098, 14.619924984), (111.625819098, 19.269608073))
            ThreePointArc((111.625819098, 19.269608073), (111.155254913, 21.88437998), (109.802610532, 24.171040417))
        make_face()
        with Locations(Location((105.067595409, 19.619924984, 0), (0, 0, 90))):
            Circle(SKETCH_1_9_R, mode=Mode.SUBTRACT)
    # profile 5 of 5: a face of its own
    with BuildSketch(Plane(origin=(0, 0, 0), x_dir=(1, 0, 0), z_dir=(0, 1, 0))):
        with BuildLine():
            Line((62.270319414, 75.246242124), (56.548408352, 75.246242124))
            Line((56.548408352, 75.246242124), (56.548408352, 66.169166182))
            ThreePointArc((56.548408352, 66.169166182), (59.467315828, 61.622843062), (64.816029914, 62.384638559))
            Line((64.816029914, 62.384638559), (71.686518841, 68.316728374))
            Line((71.686518841, 68.316728374), (67.947110848, 72.647674468))
            ThreePointArc((67.947110848, 72.647674468), (65.3919582, 74.565726803), (62.270319414, 75.246242124))
        make_face()
        with Locations(Location((61.548408352, 66.169166182, 0), (0, 0, 90))):
            Circle(SKETCH_1_9_R, mode=Mode.SUBTRACT)
    extrude(amount=EXTRUDE_5_DEPTH)

    # 草图14 → 切除-拉伸8 (cut)
    with BuildSketch(Plane(origin=(74.862925518, 0, -64.637844948), x_dir=(0.6535243124977226, 0, 0.7569055244707751), z_dir=(-0.7569055244707751, 0, 0.6535243124977226))):
        with Locations((34.899642003, 25)):
            Circle(SKETCH_14_R)
        with Locations((4.899642003, 25)):
            Circle(SKETCH_14_R)
    extrude(amount=-CUT_EXTRUDE_8_DEPTH, mode=Mode.SUBTRACT)



with BuildPart() as body_2:
    # 草图1 → Extrude 2 2 (new body)
    with BuildSketch(Plane(origin=(0, 0, 0), x_dir=(1, 0, 0), z_dir=(0, 1, 0))):
        Polygon((40.165648938, -4.822813121), (27.095162688, 10.315297369), (25.581351639, 9.008248744), (38.651837889, -6.129861746), align=None)
    extrude(amount=EXTRUDE_2_2_DEPTH)


with BuildPart() as part_1:
    add(part.part)

    add(body_2.part)  # 凸台-拉伸6 merges body 2
    # 草图1<10> → 凸台-拉伸6 (add)
    with BuildSketch(Plane(origin=(0, 0, 0), x_dir=(1, 0, 0), z_dir=(0, 1, 0))):
        Polygon((23.827541125, 14.099824991), (27.095162688, 10.315297369), (40.165648938, -4.822813121), (43.4332705, -8.607340743), (47.217798123, -5.33971918), (27.612068748, 17.367446554), align=None)
        Polygon((38.651837889, -6.129861746), (25.581351639, 9.008248744), (22.313730076, 12.792776366), (18.529202454, 9.525154804), (38.134931829, -13.18201093), (41.919459451, -9.914389368), align=None)
    extrude(amount=EXTRUDE_6_DEPTH)


solid = part_1.part
